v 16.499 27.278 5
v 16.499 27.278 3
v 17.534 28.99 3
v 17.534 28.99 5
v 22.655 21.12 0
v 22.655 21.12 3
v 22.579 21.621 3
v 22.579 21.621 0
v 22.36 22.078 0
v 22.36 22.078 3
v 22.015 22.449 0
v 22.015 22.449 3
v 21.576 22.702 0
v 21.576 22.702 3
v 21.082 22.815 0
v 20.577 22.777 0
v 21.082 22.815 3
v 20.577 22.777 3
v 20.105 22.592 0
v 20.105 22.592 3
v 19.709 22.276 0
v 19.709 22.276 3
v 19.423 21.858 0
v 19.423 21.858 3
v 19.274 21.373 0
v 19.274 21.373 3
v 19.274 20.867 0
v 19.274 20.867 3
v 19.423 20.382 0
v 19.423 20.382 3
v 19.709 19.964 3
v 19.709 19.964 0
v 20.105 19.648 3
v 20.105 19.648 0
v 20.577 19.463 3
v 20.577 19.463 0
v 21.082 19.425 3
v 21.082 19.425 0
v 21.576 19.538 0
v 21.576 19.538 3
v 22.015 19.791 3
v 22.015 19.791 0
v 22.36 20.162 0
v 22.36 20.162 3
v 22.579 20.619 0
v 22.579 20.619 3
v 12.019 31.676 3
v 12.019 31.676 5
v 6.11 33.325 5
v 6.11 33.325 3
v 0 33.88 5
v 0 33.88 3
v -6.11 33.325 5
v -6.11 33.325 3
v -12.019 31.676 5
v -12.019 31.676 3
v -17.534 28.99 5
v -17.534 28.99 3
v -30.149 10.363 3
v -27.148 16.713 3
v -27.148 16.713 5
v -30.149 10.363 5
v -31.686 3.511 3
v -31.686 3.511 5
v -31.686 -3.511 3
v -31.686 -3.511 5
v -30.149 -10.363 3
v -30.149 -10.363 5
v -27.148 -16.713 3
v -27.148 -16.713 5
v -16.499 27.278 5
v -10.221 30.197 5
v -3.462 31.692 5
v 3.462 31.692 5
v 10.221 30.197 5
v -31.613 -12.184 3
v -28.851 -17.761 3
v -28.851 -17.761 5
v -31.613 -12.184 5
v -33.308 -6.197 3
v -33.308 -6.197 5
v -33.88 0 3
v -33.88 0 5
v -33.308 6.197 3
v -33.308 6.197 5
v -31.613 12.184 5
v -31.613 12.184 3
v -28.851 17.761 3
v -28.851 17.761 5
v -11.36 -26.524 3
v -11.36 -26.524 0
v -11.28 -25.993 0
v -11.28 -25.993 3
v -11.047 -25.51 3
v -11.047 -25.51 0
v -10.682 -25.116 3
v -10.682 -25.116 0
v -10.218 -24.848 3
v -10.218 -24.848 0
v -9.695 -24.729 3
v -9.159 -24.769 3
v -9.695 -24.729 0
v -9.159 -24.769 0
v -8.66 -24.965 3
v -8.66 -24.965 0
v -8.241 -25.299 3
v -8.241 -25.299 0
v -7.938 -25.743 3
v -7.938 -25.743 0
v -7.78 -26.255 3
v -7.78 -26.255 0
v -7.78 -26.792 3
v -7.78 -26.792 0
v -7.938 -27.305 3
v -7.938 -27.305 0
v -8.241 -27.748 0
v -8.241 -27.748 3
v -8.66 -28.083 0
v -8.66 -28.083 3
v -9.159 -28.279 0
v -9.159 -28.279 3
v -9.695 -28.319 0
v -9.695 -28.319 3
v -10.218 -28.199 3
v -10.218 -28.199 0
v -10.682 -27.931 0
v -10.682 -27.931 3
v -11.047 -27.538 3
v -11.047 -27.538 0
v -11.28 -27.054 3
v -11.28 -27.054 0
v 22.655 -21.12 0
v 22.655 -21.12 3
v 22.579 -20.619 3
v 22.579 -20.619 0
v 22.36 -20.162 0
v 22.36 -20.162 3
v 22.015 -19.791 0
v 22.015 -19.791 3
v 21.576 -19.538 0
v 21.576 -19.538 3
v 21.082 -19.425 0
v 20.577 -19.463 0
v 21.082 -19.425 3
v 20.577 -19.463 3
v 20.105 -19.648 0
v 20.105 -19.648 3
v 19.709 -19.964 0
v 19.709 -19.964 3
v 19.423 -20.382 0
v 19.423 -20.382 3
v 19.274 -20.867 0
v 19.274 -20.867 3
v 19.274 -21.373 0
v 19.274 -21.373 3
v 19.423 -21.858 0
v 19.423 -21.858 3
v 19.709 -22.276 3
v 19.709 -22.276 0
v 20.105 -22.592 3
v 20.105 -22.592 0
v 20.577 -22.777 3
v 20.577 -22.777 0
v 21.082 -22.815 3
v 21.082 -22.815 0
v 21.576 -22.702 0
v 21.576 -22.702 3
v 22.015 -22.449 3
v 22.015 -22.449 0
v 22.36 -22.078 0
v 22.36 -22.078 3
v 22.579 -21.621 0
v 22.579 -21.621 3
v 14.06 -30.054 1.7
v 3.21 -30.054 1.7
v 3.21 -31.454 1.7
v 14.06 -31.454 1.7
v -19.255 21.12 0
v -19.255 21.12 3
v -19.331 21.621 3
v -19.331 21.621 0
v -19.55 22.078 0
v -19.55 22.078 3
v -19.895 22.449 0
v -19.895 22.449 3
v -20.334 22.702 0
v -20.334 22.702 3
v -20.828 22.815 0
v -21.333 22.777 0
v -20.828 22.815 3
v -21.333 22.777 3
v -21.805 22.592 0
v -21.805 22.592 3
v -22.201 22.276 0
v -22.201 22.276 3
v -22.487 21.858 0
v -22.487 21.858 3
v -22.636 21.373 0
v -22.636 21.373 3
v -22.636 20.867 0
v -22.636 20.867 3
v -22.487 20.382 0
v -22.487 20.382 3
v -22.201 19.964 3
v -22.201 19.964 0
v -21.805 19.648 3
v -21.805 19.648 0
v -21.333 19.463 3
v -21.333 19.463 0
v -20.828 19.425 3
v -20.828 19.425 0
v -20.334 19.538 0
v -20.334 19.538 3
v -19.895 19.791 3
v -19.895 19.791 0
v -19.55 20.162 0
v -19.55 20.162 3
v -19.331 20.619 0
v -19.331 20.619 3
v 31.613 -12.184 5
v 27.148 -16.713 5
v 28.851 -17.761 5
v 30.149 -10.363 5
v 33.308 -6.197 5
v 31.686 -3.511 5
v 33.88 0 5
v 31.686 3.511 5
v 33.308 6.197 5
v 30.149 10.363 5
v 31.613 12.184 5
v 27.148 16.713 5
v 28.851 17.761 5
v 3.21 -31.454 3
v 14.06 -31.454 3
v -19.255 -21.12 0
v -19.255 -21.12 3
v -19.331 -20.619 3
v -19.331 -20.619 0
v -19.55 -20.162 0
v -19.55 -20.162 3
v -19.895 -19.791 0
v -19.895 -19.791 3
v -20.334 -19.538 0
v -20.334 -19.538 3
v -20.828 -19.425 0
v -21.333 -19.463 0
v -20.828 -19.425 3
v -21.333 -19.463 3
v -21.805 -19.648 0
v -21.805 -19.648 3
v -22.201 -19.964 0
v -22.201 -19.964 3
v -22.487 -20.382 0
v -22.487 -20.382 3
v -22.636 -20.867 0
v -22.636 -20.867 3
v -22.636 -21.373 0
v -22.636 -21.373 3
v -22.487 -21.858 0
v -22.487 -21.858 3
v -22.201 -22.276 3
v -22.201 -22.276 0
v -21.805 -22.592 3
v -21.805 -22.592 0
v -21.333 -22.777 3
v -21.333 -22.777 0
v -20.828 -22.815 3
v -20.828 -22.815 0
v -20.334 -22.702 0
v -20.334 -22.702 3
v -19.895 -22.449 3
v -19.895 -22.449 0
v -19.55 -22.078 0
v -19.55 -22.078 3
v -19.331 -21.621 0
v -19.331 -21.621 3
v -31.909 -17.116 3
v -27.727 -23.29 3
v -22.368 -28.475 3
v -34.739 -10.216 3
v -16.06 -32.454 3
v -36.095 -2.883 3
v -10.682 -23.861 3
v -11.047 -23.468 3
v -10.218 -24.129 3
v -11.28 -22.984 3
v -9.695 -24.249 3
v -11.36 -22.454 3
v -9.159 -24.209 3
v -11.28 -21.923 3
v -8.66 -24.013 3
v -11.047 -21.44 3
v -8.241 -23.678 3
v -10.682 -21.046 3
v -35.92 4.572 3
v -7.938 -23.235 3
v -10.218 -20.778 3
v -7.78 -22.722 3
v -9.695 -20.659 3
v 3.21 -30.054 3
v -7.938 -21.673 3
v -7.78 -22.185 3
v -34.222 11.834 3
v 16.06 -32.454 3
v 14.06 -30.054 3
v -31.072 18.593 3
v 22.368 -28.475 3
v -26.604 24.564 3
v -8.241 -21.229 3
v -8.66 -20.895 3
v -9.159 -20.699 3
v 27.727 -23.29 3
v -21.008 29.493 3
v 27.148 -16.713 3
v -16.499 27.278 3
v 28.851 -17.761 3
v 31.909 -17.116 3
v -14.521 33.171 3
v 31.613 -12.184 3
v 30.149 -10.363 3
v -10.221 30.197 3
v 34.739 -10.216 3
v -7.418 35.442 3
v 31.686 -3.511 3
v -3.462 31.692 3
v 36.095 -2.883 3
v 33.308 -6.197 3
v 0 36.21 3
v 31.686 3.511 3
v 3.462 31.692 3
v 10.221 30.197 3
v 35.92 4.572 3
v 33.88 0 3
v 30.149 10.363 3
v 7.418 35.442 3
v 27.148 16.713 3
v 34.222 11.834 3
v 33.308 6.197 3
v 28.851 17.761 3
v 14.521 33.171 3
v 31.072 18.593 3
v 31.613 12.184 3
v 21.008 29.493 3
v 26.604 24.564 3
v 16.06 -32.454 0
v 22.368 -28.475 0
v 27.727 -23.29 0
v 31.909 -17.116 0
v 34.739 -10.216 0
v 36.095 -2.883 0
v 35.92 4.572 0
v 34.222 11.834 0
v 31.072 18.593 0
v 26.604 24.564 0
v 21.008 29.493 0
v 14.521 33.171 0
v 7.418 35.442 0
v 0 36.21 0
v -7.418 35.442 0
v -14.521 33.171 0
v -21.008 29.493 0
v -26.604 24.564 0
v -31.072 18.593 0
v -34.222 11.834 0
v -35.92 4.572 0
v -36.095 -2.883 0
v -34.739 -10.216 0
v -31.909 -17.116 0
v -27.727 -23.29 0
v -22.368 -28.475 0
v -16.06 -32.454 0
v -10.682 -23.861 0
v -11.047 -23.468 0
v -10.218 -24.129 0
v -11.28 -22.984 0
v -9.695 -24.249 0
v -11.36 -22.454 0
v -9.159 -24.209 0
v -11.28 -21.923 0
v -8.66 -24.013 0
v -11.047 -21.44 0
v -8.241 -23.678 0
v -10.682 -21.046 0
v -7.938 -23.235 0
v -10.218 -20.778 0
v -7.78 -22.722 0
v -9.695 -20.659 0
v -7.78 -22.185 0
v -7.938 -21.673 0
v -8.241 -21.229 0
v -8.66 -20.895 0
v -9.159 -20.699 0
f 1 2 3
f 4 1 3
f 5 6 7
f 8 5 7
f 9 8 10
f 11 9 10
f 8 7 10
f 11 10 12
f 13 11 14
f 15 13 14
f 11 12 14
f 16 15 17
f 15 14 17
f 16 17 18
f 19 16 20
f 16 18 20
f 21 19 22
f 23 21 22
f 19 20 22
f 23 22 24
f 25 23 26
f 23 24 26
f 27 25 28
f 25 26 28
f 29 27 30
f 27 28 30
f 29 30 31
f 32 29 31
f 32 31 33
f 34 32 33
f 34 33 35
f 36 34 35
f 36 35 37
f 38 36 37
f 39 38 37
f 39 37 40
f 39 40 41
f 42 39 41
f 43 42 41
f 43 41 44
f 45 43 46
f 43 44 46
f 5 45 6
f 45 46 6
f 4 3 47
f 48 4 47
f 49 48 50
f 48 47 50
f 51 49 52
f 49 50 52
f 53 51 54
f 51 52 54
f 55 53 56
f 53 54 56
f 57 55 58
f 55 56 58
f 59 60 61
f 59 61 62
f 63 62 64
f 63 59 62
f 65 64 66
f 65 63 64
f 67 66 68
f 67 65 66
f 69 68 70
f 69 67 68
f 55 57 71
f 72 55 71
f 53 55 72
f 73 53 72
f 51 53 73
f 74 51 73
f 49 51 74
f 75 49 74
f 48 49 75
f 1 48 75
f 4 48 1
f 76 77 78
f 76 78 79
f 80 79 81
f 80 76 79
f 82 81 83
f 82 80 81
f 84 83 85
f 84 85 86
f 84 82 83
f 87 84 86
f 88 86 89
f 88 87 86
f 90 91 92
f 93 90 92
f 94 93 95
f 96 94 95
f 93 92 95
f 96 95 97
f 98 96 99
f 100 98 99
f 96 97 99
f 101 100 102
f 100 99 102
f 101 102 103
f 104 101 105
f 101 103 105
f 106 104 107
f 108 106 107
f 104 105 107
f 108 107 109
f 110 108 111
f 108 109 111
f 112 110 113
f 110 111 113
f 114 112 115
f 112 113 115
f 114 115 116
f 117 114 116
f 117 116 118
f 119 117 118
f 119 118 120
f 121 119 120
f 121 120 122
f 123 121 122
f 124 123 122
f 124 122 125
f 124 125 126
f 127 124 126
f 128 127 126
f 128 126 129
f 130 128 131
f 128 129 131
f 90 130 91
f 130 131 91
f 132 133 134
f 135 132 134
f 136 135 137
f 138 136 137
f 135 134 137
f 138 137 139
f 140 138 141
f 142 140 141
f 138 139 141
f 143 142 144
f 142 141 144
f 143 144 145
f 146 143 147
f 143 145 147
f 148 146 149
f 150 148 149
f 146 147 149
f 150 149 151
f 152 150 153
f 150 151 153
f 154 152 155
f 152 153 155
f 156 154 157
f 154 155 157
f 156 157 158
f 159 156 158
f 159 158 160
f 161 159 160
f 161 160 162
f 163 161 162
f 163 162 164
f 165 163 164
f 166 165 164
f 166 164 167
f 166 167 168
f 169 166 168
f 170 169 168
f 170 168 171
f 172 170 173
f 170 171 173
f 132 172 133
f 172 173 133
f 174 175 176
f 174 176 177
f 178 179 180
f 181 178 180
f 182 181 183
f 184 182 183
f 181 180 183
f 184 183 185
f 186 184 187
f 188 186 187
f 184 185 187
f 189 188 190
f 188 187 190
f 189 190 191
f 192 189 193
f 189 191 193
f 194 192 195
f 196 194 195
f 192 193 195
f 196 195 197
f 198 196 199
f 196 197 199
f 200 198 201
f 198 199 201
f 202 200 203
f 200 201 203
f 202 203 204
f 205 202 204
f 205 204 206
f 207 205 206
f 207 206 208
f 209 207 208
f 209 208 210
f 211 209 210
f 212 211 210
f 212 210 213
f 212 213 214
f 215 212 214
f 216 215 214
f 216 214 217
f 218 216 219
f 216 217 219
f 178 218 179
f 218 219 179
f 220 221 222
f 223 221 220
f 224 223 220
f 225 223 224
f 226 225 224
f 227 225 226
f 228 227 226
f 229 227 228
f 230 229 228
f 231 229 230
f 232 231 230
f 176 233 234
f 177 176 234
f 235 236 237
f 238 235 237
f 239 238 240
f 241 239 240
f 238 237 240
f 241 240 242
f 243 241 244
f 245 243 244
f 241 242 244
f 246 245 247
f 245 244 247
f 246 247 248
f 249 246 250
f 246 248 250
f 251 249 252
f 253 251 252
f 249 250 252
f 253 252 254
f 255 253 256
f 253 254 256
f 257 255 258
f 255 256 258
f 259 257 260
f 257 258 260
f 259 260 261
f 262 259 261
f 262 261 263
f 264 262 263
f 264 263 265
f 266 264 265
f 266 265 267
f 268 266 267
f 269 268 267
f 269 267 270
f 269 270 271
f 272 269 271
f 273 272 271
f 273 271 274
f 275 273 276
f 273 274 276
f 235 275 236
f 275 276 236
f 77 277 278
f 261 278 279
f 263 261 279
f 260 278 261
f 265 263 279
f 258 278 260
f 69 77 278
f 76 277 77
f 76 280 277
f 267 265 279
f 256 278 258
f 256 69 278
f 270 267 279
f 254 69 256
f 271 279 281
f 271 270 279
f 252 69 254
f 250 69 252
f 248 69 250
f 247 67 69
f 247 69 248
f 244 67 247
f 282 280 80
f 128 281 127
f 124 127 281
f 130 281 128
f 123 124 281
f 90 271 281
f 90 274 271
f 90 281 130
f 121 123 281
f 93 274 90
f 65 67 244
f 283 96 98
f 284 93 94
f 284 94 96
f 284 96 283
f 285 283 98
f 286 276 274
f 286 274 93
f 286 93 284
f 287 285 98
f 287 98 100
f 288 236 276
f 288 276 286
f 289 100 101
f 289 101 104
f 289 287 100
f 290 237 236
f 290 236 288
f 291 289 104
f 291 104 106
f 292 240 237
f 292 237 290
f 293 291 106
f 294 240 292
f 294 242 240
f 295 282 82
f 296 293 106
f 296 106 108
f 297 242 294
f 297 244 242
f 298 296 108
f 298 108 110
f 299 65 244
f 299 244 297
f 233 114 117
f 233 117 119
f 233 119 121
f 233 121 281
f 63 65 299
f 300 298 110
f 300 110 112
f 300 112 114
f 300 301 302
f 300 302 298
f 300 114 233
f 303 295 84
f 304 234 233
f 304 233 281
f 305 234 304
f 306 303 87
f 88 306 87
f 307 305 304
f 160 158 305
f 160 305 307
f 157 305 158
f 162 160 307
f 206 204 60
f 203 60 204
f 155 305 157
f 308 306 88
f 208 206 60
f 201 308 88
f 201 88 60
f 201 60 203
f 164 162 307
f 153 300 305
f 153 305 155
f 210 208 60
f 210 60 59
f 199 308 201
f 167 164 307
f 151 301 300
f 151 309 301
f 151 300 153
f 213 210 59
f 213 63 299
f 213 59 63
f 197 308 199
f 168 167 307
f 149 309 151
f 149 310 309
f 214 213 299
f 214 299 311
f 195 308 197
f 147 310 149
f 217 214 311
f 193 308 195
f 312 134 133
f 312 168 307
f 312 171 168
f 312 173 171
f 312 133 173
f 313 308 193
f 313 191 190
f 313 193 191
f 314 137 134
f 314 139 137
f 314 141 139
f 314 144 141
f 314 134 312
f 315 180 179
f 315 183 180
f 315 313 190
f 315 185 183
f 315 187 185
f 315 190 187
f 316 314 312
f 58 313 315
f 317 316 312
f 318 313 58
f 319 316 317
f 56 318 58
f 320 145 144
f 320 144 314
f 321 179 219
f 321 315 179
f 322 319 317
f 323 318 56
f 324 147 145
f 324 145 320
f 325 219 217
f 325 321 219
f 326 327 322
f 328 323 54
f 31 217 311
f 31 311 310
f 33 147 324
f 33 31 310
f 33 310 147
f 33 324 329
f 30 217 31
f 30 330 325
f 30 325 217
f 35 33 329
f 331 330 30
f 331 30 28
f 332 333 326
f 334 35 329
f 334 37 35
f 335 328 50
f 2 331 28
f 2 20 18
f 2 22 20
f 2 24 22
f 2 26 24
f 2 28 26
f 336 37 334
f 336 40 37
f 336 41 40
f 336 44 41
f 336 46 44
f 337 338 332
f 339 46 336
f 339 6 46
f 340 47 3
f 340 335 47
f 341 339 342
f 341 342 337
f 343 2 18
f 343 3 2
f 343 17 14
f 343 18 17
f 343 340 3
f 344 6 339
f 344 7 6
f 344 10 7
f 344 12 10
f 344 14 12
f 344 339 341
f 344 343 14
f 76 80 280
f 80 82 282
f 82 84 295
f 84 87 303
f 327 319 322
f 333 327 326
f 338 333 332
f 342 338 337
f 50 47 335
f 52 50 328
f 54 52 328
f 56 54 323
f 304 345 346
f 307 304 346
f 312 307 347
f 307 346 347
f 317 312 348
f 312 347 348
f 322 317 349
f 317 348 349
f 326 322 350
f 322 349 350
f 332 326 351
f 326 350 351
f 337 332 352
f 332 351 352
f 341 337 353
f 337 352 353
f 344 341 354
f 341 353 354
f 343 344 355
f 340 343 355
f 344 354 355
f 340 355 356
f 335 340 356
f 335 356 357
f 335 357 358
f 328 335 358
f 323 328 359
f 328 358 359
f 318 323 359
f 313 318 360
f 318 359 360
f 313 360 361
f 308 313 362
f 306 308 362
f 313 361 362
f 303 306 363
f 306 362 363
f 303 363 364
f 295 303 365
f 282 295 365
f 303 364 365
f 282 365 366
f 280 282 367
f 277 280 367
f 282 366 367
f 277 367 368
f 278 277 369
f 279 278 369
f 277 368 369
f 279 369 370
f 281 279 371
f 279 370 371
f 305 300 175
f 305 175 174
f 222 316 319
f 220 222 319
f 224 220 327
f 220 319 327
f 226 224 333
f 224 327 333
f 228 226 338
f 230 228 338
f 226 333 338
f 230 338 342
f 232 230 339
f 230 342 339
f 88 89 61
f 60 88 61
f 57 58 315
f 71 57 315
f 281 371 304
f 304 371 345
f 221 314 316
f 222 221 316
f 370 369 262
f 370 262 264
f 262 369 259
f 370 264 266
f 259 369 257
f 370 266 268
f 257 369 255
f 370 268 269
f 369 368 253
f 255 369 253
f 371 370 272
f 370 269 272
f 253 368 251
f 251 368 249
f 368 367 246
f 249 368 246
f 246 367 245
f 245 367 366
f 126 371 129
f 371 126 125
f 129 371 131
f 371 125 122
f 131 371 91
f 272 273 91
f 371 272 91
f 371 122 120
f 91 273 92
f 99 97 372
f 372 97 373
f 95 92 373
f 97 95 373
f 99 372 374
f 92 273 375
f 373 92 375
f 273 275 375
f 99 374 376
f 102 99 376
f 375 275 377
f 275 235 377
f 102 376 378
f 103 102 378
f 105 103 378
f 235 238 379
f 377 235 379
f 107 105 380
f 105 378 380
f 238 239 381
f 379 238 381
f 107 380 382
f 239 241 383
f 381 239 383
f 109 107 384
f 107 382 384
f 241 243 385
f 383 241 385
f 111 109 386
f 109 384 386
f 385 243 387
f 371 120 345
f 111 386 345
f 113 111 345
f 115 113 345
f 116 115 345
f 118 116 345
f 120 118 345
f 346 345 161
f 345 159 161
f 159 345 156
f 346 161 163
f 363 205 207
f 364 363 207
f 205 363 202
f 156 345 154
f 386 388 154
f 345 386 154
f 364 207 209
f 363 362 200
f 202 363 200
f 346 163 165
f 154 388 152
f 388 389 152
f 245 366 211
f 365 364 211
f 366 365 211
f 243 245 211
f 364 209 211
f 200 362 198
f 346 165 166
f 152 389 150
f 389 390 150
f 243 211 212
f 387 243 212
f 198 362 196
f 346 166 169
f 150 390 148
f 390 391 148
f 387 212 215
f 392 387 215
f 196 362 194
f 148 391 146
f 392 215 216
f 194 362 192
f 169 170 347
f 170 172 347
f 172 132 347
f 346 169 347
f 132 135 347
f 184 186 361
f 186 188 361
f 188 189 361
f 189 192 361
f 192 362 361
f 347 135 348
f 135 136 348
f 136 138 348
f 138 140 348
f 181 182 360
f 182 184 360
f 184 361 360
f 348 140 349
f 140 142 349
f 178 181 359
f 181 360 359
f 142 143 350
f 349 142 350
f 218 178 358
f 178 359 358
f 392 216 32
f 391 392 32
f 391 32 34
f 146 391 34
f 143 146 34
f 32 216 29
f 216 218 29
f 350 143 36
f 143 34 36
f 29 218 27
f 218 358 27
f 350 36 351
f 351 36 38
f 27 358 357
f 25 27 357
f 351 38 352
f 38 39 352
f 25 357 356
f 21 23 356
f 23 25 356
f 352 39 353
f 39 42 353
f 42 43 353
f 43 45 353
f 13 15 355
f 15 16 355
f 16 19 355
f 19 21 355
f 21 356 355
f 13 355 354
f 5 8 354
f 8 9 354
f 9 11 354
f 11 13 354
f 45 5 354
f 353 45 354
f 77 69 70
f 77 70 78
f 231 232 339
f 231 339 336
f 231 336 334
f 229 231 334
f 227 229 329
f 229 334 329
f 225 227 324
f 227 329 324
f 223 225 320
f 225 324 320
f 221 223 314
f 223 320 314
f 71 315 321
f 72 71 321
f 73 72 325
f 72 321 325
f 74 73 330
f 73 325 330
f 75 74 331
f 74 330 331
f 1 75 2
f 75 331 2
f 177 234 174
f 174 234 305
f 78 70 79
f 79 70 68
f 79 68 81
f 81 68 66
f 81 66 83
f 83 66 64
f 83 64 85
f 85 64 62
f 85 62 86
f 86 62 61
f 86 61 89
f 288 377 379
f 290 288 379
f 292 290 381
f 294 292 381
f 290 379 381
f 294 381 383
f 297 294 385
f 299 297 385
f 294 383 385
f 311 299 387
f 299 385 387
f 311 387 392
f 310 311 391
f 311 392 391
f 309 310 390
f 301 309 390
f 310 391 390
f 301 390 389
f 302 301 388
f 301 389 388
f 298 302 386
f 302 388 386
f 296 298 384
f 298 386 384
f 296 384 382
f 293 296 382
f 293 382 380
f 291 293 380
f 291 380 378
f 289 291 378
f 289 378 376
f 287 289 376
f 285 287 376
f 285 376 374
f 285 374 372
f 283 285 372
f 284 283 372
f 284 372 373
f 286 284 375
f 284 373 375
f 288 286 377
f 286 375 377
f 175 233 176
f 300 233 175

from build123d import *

# Parameters (mm, degrees)
BOSS_EXTRUDE1_DEPTH = 3
SKETCH2_R           = 1.7
CUT_EXTRUDE1_DEPTH  = 3
BOSS_EXTRUDE2_DEPTH = 2
SKETCH6_R           = 1.8
CUT_EXTRUDE2_DEPTH  = 3
SKETCH8_W           = 10.85
SKETCH8_H           = 1.4
CUT_EXTRUDE4_DEPTH  = 1.3


with BuildPart() as part:
    # Sketch1 → Boss-Extrude1 (new body)
    with BuildSketch(Plane.XY):
        with BuildLine():
            Line((-16.06, -32.453666973), (16.06, -32.453666973))
            ThreePointArc((16.06, -32.453666973), (0, 36.21), (-16.06, -32.453666973))
        make_face()
    extrude(amount=BOSS_EXTRUDE1_DEPTH)

    # Sketch2 → Cut-Extrude1 (cut)
    with BuildSketch(Plane.XY.offset(3)):
        with Locations((-20.955, 21.12)):
            Circle(SKETCH2_R)
        with Locations((20.955, 21.12)):
            Circle(SKETCH2_R)
        with Locations((-20.955, -21.12)):
            Circle(SKETCH2_R)
        with Locations((20.955, -21.12)):
            Circle(SKETCH2_R)
    extrude(amount=-CUT_EXTRUDE1_DEPTH, mode=Mode.SUBTRACT)

    # Sketch4 → Boss-Extrude2 (add)
    with BuildSketch(Plane.XY.offset(3)):
        with BuildLine():
            Line((-17.534144761, 28.989794195), (-16.499071281, 27.278472224))
            ThreePointArc((-16.499071281, 27.278472224), (0, 31.88), (16.499071281, 27.278472224))
            Line((16.499071281, 27.278472224), (17.534144761, 28.989794195))
            ThreePointArc((17.534144761, 28.989794195), (0, 33.88), (-17.534144761, 28.989794195))
        make_face()
        with BuildLine():
            Line((-28.851381969, 17.760972903), (-27.148230731, 16.712509332))
            ThreePointArc((-27.148230731, 16.712509332), (-31.88, 0), (-27.148230731, -16.712509332))
            Line((-27.148230731, -16.712509332), (-28.851381969, -17.760972903))
            ThreePointArc((-28.851381969, -17.760972903), (-33.88, 0), (-28.851381969, 17.760972903))
        make_face()
        with BuildLine():
            Line((28.851381969, 17.760972903), (27.148230731, 16.712509332))
            ThreePointArc((27.148230731, 16.712509332), (31.88, 0), (27.148230731, -16.712509332))
            Line((27.148230731, -16.712509332), (28.851381969, -17.760972903))
            ThreePointArc((28.851381969, -17.760972903), (33.88, 0), (28.851381969, 17.760972903))
        make_face()
    extrude(amount=BOSS_EXTRUDE2_DEPTH)

    # Sketch6 → Cut-Extrude2 (cut)
    with BuildSketch(Plane(origin=(0, 0, 0), x_dir=(-1, 0, 0), z_dir=(0, 0, -1))):
        with Locations((9.56, -22.453666973)):
            Circle(SKETCH6_R)
        with Locations((9.56, -26.523666973)):
            Circle(SKETCH6_R)
    extrude(amount=-CUT_EXTRUDE2_DEPTH, mode=Mode.SUBTRACT)

    # Sketch8 → Cut-Extrude4 (cut)
    with BuildSketch(Plane.XY.offset(3)):
        with Locations((8.635, -30.753666973)):
            Rectangle(SKETCH8_W, SKETCH8_H)
    extrude(amount=-CUT_EXTRUDE4_DEPTH, mode=Mode.SUBTRACT)


solid = part.part
